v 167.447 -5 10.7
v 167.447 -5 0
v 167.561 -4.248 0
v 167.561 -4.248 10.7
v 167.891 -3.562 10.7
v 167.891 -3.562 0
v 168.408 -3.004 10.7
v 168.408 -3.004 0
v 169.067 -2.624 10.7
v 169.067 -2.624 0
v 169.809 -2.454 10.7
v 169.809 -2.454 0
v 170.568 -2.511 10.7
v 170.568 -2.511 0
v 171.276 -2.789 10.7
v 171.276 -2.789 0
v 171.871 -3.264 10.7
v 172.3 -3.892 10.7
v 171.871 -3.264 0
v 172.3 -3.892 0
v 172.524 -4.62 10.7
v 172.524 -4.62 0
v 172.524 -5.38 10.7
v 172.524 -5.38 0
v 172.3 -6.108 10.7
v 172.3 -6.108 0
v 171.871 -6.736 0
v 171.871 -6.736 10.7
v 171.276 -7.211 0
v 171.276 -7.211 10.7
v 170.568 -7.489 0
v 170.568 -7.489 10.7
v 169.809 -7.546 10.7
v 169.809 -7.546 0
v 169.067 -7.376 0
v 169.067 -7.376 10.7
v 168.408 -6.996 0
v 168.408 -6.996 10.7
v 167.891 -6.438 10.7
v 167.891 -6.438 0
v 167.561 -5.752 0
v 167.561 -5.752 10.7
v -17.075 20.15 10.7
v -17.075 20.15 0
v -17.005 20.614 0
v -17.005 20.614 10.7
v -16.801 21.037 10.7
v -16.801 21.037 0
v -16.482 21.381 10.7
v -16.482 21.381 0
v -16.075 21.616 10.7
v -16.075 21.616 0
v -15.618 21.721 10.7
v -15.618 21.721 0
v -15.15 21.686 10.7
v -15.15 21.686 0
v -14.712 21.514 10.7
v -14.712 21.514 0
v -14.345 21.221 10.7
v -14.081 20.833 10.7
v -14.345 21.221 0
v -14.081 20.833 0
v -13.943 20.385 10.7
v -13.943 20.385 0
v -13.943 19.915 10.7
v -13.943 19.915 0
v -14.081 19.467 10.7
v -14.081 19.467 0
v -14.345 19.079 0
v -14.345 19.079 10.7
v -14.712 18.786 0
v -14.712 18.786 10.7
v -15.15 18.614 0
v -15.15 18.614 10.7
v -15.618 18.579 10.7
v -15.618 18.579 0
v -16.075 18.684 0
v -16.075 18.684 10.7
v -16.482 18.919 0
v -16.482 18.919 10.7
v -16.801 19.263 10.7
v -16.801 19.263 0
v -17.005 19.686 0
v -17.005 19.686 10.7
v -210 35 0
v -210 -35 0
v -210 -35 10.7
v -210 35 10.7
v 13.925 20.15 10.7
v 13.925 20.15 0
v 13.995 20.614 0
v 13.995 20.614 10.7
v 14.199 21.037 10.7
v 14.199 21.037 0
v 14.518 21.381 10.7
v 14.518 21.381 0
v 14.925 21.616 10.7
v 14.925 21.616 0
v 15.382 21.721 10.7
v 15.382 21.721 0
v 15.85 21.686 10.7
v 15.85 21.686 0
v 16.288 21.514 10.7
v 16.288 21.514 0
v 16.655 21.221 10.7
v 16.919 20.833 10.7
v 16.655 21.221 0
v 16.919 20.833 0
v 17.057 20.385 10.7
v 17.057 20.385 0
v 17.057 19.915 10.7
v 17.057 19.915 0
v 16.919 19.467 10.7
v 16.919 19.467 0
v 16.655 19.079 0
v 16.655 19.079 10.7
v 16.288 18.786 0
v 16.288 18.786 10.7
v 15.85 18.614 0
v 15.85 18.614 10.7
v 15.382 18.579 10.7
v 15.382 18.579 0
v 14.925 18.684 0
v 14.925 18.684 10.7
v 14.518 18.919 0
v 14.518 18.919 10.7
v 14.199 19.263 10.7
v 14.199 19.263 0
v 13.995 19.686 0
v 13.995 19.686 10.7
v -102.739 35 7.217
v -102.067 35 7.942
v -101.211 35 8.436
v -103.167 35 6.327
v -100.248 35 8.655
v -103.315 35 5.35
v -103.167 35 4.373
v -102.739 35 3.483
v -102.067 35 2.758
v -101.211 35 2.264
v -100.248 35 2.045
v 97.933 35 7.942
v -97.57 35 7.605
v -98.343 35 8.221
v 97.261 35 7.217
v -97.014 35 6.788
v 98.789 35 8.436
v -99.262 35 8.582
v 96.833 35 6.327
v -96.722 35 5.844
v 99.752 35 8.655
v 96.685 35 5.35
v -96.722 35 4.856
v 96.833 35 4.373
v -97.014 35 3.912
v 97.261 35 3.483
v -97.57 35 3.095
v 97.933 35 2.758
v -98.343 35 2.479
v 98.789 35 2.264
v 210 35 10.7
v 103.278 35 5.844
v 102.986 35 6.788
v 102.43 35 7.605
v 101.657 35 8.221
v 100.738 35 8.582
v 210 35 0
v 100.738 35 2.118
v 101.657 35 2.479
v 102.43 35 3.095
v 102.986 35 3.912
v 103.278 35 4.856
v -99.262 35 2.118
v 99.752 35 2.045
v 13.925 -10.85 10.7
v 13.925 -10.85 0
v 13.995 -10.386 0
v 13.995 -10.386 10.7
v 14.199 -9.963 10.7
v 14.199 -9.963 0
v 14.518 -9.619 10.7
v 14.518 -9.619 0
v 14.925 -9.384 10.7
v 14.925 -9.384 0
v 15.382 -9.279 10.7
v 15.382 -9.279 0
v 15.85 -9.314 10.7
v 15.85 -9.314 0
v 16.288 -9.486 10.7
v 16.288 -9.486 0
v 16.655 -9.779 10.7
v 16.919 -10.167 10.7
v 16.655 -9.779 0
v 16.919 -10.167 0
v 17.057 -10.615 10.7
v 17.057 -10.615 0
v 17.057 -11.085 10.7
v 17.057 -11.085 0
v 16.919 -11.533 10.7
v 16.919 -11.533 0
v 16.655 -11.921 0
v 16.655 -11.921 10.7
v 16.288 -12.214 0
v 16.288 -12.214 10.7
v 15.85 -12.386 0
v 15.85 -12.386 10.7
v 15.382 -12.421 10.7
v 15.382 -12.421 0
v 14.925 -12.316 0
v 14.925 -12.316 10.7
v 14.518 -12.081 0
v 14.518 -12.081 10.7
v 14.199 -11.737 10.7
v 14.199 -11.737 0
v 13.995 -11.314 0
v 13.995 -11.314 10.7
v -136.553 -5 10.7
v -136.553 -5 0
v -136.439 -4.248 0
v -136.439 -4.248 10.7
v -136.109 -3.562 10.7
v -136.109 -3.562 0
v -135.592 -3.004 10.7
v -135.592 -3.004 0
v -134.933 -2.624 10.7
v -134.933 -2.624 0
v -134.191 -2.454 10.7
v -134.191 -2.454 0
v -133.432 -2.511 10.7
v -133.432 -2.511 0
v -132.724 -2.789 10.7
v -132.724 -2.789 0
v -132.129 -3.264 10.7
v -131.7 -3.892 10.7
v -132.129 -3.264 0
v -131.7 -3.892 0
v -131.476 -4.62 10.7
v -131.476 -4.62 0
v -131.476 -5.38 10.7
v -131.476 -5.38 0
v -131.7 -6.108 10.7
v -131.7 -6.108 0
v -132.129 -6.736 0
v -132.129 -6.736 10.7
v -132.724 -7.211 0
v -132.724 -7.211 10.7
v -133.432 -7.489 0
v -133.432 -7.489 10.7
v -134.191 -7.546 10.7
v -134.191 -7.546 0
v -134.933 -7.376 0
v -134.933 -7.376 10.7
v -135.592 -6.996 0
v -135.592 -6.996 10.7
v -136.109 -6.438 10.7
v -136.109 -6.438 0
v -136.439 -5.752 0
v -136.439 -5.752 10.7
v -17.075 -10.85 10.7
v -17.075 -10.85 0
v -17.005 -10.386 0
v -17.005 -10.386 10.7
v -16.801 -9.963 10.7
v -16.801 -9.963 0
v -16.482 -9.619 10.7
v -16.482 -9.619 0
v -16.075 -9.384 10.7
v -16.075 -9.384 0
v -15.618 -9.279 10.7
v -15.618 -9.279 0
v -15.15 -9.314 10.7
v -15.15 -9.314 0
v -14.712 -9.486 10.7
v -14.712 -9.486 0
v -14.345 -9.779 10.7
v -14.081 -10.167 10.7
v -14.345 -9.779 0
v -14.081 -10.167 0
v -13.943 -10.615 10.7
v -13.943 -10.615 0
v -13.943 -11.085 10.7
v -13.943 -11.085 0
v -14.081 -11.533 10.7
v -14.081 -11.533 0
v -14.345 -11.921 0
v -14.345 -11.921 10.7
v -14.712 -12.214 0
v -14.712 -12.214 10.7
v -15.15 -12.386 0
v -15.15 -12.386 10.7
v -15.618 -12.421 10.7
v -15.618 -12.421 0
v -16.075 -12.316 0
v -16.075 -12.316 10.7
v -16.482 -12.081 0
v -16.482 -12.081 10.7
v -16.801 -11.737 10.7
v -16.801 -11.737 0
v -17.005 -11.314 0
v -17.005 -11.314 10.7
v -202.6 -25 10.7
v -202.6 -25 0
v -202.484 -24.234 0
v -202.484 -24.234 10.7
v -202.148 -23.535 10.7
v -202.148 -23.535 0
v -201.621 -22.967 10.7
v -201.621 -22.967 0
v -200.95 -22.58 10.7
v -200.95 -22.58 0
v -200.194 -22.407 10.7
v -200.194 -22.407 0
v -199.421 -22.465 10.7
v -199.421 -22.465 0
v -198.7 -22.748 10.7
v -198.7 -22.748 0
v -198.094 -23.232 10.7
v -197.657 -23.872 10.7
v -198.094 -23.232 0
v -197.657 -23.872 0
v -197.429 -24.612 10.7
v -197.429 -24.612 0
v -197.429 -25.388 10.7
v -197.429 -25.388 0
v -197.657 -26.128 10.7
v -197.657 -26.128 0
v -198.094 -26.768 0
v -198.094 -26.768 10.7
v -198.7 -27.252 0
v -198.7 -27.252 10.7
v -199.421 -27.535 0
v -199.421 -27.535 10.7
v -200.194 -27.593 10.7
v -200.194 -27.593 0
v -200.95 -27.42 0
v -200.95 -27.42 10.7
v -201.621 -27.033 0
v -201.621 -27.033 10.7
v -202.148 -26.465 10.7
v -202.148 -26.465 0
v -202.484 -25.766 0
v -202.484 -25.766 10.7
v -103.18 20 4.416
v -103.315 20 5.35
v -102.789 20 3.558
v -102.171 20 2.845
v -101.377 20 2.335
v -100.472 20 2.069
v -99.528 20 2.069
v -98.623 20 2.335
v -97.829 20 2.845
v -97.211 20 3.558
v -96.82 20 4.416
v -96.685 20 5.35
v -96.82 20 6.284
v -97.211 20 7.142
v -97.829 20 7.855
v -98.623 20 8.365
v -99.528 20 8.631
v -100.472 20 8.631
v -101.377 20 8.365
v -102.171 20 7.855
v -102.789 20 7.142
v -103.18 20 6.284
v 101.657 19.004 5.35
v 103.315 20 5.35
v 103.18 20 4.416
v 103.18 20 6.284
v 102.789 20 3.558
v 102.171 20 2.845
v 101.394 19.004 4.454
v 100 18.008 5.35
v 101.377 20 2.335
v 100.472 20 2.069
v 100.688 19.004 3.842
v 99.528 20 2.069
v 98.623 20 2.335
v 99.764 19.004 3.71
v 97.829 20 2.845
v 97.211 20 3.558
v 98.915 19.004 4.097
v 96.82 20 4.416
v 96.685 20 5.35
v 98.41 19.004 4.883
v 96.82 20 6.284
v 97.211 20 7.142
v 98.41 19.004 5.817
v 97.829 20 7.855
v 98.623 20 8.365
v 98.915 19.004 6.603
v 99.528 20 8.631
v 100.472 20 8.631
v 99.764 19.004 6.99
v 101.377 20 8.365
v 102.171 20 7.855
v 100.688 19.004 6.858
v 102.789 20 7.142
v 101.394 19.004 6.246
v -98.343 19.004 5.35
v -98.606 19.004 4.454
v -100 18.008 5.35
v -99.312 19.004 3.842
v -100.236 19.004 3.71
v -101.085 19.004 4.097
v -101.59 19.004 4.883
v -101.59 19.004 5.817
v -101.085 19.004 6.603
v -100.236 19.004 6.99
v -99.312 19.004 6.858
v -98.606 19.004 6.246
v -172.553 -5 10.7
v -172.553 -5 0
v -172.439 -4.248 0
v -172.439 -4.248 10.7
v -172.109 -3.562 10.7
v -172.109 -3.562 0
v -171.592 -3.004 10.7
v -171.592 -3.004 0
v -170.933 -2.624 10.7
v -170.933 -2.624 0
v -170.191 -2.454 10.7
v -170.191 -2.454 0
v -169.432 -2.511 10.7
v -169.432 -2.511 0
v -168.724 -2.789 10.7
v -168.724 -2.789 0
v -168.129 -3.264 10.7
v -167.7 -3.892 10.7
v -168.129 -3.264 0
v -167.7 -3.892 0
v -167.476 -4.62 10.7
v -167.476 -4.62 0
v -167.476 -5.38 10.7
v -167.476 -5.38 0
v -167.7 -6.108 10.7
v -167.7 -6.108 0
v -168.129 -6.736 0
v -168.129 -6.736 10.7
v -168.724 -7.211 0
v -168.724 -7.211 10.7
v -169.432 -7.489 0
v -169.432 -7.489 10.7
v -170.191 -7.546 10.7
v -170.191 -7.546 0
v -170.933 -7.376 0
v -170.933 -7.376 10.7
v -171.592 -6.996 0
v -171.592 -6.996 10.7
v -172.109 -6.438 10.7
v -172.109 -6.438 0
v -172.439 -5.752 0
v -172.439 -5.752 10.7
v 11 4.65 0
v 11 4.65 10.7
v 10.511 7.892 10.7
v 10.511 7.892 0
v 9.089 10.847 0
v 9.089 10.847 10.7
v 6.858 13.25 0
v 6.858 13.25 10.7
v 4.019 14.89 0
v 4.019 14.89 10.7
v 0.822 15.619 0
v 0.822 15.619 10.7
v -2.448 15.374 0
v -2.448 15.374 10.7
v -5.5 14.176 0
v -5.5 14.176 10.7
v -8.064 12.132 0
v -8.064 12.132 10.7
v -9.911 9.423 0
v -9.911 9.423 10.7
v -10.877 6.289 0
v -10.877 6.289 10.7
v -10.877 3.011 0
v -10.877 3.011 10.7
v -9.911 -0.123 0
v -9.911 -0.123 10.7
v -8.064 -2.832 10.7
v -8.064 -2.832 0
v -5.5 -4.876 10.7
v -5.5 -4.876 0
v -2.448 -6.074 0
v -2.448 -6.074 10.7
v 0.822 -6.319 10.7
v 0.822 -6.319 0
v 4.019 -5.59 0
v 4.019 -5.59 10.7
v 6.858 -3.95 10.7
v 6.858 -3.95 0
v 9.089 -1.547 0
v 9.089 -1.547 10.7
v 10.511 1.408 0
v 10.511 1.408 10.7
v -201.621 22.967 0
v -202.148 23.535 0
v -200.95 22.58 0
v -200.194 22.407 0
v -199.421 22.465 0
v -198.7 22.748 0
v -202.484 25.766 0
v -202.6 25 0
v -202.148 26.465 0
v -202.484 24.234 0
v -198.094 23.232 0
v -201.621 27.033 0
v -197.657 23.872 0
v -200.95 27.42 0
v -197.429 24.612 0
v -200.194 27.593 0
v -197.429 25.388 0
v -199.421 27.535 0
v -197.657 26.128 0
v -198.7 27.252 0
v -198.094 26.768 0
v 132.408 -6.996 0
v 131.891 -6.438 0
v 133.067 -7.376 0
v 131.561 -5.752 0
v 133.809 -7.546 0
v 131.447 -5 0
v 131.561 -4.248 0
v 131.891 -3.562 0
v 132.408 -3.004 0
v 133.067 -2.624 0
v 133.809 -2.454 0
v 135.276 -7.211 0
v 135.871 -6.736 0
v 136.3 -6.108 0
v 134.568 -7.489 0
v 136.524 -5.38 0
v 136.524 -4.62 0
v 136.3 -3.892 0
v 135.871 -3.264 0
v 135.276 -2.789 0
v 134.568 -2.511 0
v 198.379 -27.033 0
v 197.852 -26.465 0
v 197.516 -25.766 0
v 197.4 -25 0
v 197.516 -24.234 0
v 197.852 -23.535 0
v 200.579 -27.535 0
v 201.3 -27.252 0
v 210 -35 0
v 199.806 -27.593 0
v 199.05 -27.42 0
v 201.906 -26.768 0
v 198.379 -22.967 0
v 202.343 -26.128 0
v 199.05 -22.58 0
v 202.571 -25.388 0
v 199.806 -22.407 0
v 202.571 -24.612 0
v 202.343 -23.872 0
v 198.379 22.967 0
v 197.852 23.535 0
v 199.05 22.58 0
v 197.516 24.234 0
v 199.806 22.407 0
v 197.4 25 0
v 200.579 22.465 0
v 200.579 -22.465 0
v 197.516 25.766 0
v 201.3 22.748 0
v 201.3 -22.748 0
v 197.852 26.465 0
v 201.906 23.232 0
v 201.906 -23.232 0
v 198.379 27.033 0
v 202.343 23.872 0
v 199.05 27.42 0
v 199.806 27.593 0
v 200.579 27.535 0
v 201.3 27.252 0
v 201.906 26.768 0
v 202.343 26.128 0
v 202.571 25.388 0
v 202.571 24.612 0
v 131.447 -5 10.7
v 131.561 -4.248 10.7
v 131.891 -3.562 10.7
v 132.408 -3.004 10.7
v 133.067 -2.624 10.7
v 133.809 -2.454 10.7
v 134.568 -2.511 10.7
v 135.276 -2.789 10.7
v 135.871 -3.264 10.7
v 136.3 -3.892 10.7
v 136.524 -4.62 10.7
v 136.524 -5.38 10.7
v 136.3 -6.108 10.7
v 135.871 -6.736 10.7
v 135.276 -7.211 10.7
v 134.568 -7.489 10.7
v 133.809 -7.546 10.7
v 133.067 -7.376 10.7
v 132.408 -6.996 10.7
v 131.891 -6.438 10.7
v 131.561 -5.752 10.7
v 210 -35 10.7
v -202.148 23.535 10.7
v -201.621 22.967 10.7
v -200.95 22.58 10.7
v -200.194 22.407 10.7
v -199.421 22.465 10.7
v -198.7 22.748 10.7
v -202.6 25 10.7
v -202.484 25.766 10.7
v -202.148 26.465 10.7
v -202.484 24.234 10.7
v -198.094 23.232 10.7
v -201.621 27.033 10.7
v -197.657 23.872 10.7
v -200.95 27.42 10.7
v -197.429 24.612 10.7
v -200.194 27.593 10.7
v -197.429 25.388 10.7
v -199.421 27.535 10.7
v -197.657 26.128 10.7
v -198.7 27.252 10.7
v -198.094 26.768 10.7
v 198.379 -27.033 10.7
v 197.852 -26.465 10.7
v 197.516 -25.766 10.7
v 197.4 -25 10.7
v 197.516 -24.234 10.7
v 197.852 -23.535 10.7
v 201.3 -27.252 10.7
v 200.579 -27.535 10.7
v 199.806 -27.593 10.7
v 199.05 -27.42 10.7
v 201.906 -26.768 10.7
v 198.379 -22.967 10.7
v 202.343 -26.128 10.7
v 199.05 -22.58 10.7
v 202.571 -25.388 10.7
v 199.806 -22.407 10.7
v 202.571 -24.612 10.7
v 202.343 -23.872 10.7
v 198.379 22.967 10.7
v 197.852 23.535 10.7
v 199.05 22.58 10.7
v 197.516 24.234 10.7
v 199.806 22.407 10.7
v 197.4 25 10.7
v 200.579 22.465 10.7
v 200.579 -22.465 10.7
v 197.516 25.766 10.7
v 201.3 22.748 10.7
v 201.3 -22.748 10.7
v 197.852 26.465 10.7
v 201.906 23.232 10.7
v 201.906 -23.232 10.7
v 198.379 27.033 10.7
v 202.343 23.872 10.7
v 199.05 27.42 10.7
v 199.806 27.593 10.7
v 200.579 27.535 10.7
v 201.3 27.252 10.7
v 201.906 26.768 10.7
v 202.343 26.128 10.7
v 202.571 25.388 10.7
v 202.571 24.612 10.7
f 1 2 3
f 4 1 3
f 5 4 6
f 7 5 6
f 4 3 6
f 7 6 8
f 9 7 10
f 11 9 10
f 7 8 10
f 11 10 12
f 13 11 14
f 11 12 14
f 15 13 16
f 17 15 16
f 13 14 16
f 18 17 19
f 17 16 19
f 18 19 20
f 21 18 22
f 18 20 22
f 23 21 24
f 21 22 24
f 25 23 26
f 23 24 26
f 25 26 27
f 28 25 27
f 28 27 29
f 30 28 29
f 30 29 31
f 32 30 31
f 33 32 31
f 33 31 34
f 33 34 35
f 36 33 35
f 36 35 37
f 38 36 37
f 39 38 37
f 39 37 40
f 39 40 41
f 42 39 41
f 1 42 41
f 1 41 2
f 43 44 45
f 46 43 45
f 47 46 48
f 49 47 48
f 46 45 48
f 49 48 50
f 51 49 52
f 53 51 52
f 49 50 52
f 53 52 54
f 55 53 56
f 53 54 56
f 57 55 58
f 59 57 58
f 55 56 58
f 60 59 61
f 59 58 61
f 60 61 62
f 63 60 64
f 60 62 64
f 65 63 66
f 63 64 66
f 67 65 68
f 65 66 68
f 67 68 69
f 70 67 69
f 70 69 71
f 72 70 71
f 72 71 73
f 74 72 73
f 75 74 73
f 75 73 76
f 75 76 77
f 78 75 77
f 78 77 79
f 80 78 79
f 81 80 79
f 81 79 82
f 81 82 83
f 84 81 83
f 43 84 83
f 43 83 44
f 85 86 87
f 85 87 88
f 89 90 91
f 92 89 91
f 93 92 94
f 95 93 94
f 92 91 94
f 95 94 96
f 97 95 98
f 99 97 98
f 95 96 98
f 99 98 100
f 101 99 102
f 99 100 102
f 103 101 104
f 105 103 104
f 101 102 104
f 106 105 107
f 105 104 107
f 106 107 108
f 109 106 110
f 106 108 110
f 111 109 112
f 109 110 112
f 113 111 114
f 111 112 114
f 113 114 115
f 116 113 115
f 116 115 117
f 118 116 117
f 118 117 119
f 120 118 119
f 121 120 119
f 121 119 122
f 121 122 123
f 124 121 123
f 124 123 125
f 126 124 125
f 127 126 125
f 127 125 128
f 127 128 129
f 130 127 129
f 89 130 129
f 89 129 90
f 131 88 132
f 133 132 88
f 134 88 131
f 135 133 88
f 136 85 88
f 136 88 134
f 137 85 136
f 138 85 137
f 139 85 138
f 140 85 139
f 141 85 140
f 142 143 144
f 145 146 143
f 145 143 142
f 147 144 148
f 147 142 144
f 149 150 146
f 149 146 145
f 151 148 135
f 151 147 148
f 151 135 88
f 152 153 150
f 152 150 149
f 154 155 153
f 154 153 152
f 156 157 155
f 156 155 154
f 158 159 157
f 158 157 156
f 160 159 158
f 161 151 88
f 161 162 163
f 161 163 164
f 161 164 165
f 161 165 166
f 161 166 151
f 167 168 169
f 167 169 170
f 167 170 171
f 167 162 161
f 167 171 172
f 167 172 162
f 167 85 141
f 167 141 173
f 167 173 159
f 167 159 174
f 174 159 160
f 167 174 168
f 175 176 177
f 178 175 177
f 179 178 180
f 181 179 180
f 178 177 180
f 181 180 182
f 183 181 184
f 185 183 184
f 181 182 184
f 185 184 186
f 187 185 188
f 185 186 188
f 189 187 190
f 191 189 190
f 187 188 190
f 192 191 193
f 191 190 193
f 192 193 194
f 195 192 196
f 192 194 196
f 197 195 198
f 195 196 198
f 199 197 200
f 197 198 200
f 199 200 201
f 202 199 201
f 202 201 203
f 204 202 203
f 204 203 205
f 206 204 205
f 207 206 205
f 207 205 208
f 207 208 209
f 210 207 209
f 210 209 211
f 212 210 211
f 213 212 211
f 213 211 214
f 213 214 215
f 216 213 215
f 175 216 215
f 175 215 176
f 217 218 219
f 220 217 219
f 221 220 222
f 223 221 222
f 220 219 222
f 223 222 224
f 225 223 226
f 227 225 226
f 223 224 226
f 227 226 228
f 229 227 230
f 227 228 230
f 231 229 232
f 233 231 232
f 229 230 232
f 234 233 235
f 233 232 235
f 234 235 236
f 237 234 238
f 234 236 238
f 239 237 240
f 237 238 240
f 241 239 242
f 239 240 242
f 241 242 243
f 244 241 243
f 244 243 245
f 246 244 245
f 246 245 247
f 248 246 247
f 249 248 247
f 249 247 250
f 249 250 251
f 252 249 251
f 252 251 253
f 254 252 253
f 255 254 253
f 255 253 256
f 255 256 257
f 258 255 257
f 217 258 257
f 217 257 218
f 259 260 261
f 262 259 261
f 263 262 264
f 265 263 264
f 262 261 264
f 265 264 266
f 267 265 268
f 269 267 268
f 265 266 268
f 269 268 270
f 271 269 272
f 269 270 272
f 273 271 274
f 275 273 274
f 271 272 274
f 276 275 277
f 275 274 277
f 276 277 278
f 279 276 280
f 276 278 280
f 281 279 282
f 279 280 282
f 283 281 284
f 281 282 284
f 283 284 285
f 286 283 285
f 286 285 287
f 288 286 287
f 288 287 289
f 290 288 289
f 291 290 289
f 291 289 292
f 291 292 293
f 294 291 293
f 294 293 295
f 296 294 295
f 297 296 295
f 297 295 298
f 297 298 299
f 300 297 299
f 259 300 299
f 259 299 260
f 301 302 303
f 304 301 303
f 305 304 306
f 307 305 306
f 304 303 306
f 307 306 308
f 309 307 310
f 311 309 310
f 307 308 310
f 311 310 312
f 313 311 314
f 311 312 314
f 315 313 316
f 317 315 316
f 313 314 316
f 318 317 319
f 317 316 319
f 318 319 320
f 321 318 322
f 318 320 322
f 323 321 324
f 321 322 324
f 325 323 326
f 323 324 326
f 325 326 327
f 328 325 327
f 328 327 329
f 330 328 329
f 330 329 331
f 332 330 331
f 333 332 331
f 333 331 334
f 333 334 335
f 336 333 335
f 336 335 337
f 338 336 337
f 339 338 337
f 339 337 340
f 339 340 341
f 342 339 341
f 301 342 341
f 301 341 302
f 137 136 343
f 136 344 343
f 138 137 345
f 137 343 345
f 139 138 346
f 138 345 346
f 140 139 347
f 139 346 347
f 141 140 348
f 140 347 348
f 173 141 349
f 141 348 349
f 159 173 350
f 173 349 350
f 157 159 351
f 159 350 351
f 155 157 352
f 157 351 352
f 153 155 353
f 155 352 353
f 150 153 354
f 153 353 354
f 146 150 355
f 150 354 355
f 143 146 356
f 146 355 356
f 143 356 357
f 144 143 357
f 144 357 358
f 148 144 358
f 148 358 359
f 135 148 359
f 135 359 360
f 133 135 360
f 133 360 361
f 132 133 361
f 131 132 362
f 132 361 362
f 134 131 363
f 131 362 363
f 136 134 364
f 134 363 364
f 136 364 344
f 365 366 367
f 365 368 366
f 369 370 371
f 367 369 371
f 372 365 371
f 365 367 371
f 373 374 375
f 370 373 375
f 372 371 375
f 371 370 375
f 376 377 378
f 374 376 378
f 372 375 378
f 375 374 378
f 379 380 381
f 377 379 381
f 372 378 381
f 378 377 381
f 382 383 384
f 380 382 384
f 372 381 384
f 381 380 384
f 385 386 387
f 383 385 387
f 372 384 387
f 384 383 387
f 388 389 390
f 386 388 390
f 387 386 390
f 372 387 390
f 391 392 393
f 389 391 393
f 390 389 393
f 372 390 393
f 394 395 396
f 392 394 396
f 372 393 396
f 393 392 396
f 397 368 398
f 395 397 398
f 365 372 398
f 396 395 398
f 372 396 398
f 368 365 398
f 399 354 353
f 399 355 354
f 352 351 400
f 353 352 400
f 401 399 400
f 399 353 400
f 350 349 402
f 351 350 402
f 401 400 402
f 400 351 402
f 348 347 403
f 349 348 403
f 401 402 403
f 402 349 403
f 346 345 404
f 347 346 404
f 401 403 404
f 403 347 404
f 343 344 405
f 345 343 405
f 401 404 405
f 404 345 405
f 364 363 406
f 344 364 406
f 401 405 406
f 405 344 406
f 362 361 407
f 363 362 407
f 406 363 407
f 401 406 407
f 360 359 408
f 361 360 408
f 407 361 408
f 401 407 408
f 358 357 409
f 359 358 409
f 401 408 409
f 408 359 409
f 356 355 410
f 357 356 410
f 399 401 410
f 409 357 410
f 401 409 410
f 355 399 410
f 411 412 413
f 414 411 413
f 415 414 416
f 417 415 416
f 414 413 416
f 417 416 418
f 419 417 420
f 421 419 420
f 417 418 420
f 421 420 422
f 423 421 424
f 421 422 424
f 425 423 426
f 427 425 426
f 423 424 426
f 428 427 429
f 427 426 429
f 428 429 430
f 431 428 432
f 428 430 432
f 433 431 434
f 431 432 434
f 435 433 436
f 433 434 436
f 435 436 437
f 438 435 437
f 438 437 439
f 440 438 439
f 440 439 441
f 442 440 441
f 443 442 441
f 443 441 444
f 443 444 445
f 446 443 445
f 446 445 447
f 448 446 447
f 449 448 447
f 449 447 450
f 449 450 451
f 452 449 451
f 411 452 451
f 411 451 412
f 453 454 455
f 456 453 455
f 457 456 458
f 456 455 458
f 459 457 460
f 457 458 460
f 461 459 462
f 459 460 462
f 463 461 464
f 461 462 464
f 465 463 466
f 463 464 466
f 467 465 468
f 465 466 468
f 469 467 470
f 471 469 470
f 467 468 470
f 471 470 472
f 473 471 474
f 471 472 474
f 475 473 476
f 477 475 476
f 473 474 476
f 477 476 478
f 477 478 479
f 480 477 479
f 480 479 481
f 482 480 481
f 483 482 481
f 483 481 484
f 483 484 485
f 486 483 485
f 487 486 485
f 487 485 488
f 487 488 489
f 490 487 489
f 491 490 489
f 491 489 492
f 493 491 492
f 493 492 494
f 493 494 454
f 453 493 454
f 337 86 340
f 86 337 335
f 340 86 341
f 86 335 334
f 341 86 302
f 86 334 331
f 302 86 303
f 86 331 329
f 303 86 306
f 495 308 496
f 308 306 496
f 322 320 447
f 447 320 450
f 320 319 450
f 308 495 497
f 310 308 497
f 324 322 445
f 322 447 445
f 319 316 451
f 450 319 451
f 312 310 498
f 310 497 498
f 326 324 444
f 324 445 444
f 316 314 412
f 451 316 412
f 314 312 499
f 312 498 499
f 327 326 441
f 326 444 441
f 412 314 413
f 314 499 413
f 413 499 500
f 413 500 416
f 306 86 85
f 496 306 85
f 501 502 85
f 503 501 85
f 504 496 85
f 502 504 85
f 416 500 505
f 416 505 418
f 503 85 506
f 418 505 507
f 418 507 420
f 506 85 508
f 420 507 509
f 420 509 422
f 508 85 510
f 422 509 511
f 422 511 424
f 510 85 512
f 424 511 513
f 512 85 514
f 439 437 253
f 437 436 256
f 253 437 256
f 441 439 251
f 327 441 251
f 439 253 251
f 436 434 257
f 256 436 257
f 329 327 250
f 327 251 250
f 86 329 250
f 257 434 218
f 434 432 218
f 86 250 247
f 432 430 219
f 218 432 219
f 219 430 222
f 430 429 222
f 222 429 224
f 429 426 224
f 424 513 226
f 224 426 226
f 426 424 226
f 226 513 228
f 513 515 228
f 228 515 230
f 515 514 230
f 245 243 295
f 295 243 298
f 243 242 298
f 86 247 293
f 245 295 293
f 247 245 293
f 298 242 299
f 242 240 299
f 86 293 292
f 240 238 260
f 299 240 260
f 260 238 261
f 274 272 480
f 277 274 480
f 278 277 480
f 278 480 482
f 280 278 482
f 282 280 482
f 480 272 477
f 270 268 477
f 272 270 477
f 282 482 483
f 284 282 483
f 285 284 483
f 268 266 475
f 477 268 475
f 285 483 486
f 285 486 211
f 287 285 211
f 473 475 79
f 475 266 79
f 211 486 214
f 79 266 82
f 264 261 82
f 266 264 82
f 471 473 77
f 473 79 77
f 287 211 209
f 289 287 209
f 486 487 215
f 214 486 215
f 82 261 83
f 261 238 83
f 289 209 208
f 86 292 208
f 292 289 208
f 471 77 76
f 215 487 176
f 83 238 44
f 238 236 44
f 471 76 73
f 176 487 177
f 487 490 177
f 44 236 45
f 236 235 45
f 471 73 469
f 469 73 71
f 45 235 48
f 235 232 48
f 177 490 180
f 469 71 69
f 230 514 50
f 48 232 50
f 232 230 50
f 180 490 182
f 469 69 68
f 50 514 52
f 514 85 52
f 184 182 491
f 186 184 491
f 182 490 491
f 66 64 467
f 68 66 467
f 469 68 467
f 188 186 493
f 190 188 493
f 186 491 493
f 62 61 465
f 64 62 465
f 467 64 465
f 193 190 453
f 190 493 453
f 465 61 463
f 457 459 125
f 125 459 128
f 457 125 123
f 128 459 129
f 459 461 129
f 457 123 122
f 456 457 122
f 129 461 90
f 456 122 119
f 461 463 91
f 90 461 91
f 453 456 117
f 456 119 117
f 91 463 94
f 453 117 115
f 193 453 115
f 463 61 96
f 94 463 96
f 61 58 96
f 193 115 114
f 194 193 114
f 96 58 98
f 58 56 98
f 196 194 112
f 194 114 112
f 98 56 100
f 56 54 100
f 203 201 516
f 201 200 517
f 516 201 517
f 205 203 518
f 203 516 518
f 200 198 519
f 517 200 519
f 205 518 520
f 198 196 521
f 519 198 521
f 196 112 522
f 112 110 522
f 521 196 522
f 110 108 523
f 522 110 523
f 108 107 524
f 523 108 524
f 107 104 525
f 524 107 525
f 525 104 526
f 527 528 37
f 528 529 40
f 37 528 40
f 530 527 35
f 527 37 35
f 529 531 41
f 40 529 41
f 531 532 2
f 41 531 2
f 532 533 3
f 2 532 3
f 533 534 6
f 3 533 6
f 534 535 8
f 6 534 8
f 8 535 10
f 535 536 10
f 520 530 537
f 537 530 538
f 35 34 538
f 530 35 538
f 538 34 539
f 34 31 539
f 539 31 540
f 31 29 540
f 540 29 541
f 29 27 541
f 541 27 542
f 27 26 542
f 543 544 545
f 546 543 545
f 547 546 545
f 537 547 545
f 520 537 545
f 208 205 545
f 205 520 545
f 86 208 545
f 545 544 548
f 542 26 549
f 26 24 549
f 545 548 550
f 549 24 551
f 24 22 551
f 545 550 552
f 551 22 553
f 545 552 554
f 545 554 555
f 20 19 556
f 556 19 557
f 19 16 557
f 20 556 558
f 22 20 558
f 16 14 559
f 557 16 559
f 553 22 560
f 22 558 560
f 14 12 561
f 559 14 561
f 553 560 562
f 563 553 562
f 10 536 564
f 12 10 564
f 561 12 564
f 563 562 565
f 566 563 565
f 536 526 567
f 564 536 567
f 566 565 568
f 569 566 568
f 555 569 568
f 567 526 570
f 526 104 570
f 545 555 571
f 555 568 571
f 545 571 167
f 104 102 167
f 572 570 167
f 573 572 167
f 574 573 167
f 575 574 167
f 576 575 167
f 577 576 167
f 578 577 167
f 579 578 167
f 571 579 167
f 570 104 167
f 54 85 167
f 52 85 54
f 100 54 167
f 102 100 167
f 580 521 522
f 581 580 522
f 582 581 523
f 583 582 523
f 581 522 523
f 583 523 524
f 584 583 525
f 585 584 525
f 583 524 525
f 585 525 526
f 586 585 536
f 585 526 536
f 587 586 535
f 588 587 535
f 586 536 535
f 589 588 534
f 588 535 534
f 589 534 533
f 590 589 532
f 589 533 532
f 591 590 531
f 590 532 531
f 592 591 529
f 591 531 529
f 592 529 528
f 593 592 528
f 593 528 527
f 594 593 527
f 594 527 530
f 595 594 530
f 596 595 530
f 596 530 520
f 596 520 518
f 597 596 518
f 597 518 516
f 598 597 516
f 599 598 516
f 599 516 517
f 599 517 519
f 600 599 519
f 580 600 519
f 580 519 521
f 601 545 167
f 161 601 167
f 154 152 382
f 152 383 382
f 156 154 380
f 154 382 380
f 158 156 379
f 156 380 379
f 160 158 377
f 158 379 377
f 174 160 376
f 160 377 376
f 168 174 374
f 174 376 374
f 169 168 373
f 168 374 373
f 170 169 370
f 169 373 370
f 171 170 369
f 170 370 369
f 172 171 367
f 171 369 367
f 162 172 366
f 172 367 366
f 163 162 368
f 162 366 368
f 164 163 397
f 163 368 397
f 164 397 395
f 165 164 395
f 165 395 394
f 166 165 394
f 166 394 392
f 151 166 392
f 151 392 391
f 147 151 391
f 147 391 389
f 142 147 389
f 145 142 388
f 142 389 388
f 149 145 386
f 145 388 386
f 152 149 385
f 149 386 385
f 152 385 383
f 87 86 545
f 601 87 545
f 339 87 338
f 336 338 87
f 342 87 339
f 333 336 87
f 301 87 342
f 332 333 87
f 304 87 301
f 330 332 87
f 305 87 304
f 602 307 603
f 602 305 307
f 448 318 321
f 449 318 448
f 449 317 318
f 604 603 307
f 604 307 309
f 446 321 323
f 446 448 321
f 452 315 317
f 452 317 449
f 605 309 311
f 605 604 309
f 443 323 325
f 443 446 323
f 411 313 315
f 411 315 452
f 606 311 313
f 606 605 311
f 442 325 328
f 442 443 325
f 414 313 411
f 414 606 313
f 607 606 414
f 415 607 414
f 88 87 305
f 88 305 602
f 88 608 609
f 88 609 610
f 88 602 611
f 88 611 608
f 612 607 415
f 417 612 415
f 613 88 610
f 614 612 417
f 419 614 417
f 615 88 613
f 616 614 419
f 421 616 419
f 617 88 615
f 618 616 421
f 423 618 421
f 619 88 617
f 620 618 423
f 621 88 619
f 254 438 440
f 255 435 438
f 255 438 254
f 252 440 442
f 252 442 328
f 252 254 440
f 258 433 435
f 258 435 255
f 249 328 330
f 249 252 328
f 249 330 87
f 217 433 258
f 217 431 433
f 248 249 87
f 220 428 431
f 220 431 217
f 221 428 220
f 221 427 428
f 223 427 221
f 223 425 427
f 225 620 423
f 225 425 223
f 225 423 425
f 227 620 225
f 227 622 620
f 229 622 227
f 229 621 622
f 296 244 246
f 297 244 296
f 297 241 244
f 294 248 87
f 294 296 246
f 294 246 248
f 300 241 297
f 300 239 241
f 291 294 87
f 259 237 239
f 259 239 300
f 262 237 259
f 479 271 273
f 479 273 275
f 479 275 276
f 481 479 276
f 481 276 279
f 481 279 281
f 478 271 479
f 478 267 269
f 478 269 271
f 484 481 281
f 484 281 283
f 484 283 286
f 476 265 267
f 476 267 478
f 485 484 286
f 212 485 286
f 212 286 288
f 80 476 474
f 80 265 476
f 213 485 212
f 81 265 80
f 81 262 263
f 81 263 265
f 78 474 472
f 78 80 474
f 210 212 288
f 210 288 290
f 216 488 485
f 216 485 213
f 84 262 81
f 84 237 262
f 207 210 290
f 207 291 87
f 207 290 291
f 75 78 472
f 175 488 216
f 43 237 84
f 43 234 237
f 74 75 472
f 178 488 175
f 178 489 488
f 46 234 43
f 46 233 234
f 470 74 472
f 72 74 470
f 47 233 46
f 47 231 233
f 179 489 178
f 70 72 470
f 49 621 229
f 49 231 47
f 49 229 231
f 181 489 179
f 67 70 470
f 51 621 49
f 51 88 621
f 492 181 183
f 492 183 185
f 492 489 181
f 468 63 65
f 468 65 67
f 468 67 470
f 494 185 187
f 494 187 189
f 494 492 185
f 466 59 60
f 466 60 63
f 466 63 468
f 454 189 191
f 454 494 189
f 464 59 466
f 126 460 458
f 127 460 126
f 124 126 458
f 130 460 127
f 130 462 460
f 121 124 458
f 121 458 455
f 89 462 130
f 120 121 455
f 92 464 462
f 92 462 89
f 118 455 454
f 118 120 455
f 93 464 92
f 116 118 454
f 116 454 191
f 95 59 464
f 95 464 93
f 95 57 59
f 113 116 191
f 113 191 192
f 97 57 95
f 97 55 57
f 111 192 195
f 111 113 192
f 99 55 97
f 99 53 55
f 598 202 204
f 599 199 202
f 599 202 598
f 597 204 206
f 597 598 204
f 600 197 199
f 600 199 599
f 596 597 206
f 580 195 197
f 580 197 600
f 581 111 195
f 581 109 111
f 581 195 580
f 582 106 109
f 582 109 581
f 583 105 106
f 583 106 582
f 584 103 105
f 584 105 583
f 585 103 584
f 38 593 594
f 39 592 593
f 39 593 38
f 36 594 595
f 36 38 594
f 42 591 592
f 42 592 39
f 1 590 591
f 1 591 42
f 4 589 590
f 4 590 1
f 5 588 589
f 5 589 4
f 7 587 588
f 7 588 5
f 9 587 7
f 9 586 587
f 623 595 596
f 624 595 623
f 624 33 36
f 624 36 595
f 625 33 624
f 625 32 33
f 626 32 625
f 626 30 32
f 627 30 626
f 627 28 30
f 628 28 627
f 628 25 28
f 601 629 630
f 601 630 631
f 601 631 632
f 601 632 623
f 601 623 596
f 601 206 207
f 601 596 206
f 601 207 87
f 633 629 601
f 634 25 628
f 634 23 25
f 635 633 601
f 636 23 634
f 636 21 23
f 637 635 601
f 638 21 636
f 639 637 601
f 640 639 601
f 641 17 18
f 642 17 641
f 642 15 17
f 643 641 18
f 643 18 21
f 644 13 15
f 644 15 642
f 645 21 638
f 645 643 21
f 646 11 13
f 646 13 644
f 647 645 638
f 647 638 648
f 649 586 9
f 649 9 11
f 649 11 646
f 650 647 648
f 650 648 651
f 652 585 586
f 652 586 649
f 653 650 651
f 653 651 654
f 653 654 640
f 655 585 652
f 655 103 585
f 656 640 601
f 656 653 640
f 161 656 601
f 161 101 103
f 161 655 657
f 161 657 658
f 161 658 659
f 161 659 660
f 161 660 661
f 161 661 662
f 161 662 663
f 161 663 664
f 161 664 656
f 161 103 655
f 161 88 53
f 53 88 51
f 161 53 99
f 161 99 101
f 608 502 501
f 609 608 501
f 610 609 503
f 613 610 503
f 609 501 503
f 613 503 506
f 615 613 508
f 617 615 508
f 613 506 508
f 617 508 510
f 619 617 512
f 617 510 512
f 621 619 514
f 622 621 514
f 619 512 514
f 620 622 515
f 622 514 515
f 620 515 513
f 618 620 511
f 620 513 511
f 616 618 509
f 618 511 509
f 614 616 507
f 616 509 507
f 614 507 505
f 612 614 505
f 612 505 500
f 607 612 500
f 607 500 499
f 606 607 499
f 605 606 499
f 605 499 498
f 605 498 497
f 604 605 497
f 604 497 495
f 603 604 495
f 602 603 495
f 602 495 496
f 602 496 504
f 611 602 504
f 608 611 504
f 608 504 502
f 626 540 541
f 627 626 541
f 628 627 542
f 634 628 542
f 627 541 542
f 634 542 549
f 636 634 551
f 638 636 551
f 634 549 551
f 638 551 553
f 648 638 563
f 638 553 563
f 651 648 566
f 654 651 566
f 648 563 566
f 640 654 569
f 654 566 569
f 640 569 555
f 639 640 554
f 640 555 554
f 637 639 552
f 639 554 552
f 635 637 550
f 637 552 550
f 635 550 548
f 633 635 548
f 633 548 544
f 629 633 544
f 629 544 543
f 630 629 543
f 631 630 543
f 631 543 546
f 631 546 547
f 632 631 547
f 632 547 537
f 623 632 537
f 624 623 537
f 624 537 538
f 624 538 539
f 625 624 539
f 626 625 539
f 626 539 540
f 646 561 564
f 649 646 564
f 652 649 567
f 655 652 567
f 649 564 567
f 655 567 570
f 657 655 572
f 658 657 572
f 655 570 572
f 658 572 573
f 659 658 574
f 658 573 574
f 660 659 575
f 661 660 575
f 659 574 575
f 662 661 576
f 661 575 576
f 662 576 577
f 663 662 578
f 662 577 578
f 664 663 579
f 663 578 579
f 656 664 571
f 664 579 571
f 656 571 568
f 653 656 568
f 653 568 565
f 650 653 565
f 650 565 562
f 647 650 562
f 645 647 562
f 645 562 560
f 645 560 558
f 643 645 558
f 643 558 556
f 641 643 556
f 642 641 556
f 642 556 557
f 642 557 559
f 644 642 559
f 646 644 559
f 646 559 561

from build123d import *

# Parameters (mm, degrees)
ESBO_O1_W                                   = 420
ESBO_O1_H                                   = 70
RESSALTO_EXTRUS_O1_DEPTH                    = 10.7
ESBO_O4_R                                   = 11
CORTE_EXTRUS_O3_DEPTH                       = 11.7
FURO_ROSCADO_PARA_CONDU_TE_DE_10_321_D      = 5.1054
FURO_ROSCADO_PARA_CONDU_TE_DE_M5X0_81_D     = 5.2
FURO_ROSCADO_PARA_CONDU_TE_DE_M3X0_51_D     = 3.15
FURO_ROSCADO_PARA_CONDU_TE_DE_1_4_281_D     = 6.6294
FURO_ROSCADO_PARA_CONDU_TE_DE_1_4_281_DEPTH = 15
FURO_ROSCADO_PARA_CONDU_TE_DE_1_4_281_TIP   = 1.991672694


with BuildPart() as part:
    # Esboço1 → Ressalto-extrusão1 (new body)
    with BuildSketch(Plane.XY):
        Rectangle(ESBO_O1_W, ESBO_O1_H)
    extrude(amount=RESSALTO_EXTRUS_O1_DEPTH)

    # Esboço4 → Corte-extrusão3 (cut, through all)
    with BuildSketch(Plane.XY.offset(10.7)):
        with Locations((0, 4.65)):
            Circle(ESBO_O4_R)
    extrude(amount=-CORTE_EXTRUS_O3_DEPTH, mode=Mode.SUBTRACT)

    # Furo roscado para conduíte de #10-321 (through all)
    with Locations(Plane.XY.offset(10.7)):
        with Locations((-170, -5), (-134, -5), (134, -5), (170, -5)):
            Hole(FURO_ROSCADO_PARA_CONDU_TE_DE_10_321_D / 2)

    # Furo roscado para conduíte de M5x0.81 (through all)
    with Locations(Plane.XY.offset(10.7)):
        with Locations((-200, 25), (-200, -25), (200, -25), (200, 25)):
            Hole(FURO_ROSCADO_PARA_CONDU_TE_DE_M5X0_81_D / 2)

    # Furo roscado para conduíte de M3x0.51 (through all)
    with Locations(Plane.XY.offset(10.7)):
        with Locations((-15.5, 20.15), (-15.5, -10.85), (15.5, -10.85), (15.5, 20.15)):
            Hole(FURO_ROSCADO_PARA_CONDU_TE_DE_M3X0_51_D / 2)

    # Furo roscado para conduíte de 1/4-281
    with Locations(Plane(origin=(0, 35, 0), x_dir=(1, 0, 0), z_dir=(0, 1, 0))):
        with Locations((-100, -5.35), (100, -5.35)):
            Hole(FURO_ROSCADO_PARA_CONDU_TE_DE_1_4_281_D / 2, depth=FURO_ROSCADO_PARA_CONDU_TE_DE_1_4_281_DEPTH)
            with Locations((0, 0, -(FURO_ROSCADO_PARA_CONDU_TE_DE_1_4_281_DEPTH + FURO_ROSCADO_PARA_CONDU_TE_DE_1_4_281_TIP / 2))):  # 118° drill point
                Cone(0, FURO_ROSCADO_PARA_CONDU_TE_DE_1_4_281_D / 2, FURO_ROSCADO_PARA_CONDU_TE_DE_1_4_281_TIP, mode=Mode.SUBTRACT)


solid = part.part
